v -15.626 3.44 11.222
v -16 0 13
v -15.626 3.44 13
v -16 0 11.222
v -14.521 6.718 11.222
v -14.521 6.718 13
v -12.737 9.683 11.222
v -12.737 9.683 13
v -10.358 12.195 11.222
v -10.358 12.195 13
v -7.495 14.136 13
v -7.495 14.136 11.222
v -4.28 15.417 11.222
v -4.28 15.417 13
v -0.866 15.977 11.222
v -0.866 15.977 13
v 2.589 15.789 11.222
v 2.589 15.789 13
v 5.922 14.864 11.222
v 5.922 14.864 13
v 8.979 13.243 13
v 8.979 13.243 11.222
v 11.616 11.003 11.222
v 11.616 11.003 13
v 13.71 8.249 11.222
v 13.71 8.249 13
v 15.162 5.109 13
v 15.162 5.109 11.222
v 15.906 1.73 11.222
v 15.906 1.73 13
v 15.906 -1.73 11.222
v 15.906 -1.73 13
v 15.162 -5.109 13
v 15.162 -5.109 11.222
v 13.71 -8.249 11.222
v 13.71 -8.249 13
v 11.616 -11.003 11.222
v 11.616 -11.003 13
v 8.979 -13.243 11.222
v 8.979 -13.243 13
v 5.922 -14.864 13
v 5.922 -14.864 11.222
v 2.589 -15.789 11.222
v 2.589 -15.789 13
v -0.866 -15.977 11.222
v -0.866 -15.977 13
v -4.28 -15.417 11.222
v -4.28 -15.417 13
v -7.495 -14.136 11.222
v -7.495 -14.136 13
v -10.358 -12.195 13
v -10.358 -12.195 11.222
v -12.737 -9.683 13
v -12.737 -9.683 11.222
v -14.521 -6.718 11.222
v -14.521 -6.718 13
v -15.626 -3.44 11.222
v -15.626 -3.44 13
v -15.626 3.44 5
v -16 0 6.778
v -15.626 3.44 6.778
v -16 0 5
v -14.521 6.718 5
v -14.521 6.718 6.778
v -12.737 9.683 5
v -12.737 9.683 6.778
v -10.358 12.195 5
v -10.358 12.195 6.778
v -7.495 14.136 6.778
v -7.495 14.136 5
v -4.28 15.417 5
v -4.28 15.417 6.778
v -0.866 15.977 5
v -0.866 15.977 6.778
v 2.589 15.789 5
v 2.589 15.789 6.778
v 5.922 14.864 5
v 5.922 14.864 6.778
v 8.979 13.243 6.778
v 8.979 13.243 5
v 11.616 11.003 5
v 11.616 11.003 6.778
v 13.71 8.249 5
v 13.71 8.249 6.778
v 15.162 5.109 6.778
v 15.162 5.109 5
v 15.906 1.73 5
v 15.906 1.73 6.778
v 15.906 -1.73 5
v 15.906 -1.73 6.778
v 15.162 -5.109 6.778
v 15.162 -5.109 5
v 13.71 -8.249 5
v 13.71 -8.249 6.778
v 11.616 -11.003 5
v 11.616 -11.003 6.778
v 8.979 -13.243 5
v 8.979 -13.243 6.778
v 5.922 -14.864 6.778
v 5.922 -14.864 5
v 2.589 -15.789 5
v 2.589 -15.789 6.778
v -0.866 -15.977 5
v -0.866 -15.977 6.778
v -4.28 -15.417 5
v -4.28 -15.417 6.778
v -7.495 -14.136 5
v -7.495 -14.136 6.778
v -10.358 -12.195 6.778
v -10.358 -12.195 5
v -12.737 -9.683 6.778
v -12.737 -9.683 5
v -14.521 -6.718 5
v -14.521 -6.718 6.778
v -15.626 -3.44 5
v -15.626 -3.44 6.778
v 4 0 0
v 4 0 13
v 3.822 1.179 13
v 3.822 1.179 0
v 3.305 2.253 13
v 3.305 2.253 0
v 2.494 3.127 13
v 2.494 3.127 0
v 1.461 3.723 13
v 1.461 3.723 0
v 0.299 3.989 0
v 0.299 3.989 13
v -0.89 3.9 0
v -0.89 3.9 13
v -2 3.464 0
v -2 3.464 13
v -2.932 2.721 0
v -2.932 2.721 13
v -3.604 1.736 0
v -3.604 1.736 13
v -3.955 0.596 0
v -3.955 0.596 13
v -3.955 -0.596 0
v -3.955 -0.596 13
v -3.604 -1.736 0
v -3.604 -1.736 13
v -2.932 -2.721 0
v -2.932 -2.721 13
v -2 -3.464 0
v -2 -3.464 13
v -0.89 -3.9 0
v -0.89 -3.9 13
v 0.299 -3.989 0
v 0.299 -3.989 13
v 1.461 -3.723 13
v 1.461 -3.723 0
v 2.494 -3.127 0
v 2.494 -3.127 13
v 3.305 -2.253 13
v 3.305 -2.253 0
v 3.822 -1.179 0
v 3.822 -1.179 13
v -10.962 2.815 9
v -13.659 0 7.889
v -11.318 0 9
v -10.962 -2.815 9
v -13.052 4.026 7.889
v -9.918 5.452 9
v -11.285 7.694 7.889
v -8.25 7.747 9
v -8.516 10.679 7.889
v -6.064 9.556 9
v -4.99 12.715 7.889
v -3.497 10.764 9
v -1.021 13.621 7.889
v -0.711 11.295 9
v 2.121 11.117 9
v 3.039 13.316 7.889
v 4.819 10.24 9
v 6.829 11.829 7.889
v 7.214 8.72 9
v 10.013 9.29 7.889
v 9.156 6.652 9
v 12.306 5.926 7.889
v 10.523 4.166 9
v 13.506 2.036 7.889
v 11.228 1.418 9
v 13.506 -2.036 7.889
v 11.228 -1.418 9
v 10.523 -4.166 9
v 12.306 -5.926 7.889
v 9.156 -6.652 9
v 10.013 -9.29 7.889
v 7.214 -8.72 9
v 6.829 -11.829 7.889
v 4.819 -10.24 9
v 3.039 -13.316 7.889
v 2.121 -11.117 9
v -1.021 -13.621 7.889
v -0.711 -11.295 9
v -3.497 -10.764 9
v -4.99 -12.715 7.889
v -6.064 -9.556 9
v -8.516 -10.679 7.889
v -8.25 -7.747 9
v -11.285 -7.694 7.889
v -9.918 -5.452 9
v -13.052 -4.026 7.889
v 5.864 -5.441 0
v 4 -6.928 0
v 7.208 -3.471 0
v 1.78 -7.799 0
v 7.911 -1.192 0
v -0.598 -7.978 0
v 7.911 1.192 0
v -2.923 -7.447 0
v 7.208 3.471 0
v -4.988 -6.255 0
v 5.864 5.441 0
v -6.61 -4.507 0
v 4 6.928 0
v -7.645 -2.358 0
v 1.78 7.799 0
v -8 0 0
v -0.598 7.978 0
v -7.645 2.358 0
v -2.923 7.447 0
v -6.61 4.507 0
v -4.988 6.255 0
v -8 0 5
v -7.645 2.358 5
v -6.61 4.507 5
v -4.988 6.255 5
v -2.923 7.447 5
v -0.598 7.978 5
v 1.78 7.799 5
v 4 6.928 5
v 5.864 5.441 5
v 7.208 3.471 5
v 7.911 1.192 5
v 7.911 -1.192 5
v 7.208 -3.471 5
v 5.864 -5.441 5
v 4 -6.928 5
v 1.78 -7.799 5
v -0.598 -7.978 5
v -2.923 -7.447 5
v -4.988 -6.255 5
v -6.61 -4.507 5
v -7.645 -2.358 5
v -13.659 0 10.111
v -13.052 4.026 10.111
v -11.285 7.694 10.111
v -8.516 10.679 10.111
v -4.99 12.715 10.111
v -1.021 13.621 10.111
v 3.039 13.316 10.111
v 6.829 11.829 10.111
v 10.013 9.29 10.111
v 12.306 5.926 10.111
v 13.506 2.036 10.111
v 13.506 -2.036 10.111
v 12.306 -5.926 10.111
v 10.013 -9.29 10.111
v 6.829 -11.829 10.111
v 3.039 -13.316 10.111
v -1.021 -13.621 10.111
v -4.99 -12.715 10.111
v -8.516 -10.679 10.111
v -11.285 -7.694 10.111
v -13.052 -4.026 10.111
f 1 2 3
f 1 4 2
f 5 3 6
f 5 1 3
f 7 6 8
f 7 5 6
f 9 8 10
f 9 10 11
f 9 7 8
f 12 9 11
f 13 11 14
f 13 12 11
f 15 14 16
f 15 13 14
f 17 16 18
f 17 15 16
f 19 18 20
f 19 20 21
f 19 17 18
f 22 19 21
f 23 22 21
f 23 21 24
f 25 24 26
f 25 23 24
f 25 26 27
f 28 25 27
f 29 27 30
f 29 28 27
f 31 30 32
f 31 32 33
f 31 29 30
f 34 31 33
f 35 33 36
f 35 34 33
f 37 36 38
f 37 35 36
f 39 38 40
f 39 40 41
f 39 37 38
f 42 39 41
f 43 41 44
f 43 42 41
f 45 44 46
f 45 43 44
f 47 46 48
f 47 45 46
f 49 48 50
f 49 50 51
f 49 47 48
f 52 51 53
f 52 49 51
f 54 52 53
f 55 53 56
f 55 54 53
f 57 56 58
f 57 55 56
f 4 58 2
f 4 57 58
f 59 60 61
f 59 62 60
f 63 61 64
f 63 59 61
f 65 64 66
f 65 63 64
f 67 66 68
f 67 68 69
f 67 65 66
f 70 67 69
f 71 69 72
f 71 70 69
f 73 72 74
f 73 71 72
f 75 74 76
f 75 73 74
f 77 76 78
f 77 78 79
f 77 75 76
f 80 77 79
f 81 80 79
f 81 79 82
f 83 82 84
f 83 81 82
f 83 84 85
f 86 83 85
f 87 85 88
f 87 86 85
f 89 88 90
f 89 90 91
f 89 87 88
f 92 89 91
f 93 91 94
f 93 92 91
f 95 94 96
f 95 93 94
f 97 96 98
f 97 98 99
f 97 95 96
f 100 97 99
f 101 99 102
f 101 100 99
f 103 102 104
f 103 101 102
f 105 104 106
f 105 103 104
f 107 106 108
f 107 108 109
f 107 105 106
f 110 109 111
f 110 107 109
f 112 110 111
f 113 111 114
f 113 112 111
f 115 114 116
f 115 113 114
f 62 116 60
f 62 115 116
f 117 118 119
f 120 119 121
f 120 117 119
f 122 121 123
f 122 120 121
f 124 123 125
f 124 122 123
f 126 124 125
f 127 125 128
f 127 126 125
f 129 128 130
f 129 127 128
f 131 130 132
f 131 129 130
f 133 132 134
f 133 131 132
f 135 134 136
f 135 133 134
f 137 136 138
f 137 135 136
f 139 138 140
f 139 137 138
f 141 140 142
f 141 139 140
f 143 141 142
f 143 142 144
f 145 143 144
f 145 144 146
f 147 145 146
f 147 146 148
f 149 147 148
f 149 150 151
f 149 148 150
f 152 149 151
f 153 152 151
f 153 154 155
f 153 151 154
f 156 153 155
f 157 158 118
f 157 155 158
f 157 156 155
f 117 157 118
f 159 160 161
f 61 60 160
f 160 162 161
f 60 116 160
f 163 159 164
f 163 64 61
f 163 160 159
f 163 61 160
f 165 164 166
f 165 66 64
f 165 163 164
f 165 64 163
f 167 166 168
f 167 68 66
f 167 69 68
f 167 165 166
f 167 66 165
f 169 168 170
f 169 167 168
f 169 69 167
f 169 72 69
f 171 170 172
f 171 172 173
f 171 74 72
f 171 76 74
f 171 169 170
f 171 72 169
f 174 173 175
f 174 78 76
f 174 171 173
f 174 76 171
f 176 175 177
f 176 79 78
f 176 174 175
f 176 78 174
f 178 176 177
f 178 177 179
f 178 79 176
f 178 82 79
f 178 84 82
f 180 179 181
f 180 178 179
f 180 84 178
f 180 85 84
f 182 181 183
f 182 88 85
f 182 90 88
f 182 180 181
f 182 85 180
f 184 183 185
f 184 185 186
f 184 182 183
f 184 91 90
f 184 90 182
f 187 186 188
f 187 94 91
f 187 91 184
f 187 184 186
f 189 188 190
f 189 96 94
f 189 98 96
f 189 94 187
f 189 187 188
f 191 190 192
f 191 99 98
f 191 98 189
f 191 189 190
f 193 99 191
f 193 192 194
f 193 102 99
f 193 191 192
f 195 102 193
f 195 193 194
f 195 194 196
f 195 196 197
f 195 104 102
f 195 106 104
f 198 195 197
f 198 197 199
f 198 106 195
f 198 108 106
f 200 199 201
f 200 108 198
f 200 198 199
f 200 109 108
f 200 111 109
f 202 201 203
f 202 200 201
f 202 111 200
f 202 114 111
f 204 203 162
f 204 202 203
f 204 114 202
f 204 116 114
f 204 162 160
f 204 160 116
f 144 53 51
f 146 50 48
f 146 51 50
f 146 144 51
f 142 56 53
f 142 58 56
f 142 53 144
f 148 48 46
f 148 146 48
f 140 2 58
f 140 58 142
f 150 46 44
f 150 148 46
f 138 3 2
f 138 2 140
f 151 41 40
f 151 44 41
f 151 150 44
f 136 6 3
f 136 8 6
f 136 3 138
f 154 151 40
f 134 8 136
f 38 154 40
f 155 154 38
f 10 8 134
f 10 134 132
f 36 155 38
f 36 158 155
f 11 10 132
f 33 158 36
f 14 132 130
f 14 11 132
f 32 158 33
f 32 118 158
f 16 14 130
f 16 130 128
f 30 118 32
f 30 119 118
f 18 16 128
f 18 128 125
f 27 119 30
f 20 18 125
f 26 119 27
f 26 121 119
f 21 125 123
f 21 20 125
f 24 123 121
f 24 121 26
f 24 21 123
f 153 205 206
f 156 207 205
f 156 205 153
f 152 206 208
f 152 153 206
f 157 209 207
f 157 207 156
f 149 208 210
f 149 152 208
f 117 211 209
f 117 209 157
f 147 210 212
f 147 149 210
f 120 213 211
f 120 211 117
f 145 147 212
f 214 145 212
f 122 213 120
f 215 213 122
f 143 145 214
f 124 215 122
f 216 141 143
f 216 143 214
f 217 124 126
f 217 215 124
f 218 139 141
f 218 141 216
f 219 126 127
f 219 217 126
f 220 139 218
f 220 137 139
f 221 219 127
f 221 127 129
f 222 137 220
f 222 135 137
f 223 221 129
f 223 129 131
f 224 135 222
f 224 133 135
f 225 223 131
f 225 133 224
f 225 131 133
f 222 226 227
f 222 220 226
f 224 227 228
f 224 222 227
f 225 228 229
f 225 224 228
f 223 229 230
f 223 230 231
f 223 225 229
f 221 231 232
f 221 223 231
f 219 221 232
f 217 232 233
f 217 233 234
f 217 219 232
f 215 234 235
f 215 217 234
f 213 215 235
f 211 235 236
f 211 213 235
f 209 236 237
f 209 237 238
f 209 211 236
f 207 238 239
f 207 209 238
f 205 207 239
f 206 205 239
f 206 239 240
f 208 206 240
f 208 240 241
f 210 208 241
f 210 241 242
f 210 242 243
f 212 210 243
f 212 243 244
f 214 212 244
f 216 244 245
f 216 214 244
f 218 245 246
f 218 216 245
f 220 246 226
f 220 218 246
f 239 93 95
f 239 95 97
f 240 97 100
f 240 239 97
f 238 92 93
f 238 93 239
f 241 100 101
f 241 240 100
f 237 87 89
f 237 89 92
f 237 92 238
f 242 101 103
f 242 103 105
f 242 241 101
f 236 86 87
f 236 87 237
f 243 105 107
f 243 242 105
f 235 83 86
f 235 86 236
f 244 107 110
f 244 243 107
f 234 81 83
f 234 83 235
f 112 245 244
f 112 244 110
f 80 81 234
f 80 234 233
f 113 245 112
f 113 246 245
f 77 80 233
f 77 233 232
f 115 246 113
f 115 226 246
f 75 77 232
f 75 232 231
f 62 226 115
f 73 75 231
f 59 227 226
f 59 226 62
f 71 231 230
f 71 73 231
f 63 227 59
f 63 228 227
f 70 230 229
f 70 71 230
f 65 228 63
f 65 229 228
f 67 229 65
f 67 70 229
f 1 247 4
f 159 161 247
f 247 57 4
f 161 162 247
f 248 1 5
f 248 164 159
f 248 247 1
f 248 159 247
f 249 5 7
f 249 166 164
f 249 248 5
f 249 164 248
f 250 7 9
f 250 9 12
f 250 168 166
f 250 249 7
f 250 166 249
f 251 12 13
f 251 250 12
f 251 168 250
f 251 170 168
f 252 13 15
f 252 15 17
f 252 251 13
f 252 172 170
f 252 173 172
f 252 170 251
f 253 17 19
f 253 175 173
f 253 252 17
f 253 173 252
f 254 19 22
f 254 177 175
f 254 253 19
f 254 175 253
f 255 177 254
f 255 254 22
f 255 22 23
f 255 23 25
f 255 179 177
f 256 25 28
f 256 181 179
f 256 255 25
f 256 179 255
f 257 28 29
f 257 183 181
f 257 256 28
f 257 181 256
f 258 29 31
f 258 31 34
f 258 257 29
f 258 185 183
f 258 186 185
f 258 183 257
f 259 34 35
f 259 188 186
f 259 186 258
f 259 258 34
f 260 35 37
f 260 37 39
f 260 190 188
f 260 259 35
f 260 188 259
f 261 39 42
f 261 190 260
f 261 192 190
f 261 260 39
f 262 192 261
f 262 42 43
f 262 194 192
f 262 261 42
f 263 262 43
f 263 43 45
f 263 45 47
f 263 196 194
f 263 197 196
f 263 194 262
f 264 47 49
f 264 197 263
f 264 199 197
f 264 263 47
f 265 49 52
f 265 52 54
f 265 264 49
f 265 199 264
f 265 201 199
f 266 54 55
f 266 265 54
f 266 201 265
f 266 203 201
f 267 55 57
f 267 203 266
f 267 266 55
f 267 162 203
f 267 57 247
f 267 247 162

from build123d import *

# Parameters (mm, degrees)
F2_R          = 4
F3_DEPTH      = 25
F3_DEPTH_BACK = 25


with BuildPart() as f1:
    # F0 (on Front) → F1 (revolve)
    with BuildSketch(Plane.XZ):
        Polygon((-8, 0), (0, 0), (0, 13), (-8, 13), (-16, 13), (-16, 11.2221399145), (-11.3175004572, 9), (-16, 6.7778600855), (-16, 5), (-8, 5), align=None)
    revolve(axis=Axis((0, 0, 6.5), (0, 0, -1)))

    # F2 (on Top) → F3 (cut, two sides)
    with BuildSketch(Plane.XY) as f3_sk:
        Circle(F2_R)
    extrude(amount=-F3_DEPTH, mode=Mode.SUBTRACT)
    extrude(f3_sk.sketch, amount=F3_DEPTH_BACK, mode=Mode.SUBTRACT)


solid = f1.part
